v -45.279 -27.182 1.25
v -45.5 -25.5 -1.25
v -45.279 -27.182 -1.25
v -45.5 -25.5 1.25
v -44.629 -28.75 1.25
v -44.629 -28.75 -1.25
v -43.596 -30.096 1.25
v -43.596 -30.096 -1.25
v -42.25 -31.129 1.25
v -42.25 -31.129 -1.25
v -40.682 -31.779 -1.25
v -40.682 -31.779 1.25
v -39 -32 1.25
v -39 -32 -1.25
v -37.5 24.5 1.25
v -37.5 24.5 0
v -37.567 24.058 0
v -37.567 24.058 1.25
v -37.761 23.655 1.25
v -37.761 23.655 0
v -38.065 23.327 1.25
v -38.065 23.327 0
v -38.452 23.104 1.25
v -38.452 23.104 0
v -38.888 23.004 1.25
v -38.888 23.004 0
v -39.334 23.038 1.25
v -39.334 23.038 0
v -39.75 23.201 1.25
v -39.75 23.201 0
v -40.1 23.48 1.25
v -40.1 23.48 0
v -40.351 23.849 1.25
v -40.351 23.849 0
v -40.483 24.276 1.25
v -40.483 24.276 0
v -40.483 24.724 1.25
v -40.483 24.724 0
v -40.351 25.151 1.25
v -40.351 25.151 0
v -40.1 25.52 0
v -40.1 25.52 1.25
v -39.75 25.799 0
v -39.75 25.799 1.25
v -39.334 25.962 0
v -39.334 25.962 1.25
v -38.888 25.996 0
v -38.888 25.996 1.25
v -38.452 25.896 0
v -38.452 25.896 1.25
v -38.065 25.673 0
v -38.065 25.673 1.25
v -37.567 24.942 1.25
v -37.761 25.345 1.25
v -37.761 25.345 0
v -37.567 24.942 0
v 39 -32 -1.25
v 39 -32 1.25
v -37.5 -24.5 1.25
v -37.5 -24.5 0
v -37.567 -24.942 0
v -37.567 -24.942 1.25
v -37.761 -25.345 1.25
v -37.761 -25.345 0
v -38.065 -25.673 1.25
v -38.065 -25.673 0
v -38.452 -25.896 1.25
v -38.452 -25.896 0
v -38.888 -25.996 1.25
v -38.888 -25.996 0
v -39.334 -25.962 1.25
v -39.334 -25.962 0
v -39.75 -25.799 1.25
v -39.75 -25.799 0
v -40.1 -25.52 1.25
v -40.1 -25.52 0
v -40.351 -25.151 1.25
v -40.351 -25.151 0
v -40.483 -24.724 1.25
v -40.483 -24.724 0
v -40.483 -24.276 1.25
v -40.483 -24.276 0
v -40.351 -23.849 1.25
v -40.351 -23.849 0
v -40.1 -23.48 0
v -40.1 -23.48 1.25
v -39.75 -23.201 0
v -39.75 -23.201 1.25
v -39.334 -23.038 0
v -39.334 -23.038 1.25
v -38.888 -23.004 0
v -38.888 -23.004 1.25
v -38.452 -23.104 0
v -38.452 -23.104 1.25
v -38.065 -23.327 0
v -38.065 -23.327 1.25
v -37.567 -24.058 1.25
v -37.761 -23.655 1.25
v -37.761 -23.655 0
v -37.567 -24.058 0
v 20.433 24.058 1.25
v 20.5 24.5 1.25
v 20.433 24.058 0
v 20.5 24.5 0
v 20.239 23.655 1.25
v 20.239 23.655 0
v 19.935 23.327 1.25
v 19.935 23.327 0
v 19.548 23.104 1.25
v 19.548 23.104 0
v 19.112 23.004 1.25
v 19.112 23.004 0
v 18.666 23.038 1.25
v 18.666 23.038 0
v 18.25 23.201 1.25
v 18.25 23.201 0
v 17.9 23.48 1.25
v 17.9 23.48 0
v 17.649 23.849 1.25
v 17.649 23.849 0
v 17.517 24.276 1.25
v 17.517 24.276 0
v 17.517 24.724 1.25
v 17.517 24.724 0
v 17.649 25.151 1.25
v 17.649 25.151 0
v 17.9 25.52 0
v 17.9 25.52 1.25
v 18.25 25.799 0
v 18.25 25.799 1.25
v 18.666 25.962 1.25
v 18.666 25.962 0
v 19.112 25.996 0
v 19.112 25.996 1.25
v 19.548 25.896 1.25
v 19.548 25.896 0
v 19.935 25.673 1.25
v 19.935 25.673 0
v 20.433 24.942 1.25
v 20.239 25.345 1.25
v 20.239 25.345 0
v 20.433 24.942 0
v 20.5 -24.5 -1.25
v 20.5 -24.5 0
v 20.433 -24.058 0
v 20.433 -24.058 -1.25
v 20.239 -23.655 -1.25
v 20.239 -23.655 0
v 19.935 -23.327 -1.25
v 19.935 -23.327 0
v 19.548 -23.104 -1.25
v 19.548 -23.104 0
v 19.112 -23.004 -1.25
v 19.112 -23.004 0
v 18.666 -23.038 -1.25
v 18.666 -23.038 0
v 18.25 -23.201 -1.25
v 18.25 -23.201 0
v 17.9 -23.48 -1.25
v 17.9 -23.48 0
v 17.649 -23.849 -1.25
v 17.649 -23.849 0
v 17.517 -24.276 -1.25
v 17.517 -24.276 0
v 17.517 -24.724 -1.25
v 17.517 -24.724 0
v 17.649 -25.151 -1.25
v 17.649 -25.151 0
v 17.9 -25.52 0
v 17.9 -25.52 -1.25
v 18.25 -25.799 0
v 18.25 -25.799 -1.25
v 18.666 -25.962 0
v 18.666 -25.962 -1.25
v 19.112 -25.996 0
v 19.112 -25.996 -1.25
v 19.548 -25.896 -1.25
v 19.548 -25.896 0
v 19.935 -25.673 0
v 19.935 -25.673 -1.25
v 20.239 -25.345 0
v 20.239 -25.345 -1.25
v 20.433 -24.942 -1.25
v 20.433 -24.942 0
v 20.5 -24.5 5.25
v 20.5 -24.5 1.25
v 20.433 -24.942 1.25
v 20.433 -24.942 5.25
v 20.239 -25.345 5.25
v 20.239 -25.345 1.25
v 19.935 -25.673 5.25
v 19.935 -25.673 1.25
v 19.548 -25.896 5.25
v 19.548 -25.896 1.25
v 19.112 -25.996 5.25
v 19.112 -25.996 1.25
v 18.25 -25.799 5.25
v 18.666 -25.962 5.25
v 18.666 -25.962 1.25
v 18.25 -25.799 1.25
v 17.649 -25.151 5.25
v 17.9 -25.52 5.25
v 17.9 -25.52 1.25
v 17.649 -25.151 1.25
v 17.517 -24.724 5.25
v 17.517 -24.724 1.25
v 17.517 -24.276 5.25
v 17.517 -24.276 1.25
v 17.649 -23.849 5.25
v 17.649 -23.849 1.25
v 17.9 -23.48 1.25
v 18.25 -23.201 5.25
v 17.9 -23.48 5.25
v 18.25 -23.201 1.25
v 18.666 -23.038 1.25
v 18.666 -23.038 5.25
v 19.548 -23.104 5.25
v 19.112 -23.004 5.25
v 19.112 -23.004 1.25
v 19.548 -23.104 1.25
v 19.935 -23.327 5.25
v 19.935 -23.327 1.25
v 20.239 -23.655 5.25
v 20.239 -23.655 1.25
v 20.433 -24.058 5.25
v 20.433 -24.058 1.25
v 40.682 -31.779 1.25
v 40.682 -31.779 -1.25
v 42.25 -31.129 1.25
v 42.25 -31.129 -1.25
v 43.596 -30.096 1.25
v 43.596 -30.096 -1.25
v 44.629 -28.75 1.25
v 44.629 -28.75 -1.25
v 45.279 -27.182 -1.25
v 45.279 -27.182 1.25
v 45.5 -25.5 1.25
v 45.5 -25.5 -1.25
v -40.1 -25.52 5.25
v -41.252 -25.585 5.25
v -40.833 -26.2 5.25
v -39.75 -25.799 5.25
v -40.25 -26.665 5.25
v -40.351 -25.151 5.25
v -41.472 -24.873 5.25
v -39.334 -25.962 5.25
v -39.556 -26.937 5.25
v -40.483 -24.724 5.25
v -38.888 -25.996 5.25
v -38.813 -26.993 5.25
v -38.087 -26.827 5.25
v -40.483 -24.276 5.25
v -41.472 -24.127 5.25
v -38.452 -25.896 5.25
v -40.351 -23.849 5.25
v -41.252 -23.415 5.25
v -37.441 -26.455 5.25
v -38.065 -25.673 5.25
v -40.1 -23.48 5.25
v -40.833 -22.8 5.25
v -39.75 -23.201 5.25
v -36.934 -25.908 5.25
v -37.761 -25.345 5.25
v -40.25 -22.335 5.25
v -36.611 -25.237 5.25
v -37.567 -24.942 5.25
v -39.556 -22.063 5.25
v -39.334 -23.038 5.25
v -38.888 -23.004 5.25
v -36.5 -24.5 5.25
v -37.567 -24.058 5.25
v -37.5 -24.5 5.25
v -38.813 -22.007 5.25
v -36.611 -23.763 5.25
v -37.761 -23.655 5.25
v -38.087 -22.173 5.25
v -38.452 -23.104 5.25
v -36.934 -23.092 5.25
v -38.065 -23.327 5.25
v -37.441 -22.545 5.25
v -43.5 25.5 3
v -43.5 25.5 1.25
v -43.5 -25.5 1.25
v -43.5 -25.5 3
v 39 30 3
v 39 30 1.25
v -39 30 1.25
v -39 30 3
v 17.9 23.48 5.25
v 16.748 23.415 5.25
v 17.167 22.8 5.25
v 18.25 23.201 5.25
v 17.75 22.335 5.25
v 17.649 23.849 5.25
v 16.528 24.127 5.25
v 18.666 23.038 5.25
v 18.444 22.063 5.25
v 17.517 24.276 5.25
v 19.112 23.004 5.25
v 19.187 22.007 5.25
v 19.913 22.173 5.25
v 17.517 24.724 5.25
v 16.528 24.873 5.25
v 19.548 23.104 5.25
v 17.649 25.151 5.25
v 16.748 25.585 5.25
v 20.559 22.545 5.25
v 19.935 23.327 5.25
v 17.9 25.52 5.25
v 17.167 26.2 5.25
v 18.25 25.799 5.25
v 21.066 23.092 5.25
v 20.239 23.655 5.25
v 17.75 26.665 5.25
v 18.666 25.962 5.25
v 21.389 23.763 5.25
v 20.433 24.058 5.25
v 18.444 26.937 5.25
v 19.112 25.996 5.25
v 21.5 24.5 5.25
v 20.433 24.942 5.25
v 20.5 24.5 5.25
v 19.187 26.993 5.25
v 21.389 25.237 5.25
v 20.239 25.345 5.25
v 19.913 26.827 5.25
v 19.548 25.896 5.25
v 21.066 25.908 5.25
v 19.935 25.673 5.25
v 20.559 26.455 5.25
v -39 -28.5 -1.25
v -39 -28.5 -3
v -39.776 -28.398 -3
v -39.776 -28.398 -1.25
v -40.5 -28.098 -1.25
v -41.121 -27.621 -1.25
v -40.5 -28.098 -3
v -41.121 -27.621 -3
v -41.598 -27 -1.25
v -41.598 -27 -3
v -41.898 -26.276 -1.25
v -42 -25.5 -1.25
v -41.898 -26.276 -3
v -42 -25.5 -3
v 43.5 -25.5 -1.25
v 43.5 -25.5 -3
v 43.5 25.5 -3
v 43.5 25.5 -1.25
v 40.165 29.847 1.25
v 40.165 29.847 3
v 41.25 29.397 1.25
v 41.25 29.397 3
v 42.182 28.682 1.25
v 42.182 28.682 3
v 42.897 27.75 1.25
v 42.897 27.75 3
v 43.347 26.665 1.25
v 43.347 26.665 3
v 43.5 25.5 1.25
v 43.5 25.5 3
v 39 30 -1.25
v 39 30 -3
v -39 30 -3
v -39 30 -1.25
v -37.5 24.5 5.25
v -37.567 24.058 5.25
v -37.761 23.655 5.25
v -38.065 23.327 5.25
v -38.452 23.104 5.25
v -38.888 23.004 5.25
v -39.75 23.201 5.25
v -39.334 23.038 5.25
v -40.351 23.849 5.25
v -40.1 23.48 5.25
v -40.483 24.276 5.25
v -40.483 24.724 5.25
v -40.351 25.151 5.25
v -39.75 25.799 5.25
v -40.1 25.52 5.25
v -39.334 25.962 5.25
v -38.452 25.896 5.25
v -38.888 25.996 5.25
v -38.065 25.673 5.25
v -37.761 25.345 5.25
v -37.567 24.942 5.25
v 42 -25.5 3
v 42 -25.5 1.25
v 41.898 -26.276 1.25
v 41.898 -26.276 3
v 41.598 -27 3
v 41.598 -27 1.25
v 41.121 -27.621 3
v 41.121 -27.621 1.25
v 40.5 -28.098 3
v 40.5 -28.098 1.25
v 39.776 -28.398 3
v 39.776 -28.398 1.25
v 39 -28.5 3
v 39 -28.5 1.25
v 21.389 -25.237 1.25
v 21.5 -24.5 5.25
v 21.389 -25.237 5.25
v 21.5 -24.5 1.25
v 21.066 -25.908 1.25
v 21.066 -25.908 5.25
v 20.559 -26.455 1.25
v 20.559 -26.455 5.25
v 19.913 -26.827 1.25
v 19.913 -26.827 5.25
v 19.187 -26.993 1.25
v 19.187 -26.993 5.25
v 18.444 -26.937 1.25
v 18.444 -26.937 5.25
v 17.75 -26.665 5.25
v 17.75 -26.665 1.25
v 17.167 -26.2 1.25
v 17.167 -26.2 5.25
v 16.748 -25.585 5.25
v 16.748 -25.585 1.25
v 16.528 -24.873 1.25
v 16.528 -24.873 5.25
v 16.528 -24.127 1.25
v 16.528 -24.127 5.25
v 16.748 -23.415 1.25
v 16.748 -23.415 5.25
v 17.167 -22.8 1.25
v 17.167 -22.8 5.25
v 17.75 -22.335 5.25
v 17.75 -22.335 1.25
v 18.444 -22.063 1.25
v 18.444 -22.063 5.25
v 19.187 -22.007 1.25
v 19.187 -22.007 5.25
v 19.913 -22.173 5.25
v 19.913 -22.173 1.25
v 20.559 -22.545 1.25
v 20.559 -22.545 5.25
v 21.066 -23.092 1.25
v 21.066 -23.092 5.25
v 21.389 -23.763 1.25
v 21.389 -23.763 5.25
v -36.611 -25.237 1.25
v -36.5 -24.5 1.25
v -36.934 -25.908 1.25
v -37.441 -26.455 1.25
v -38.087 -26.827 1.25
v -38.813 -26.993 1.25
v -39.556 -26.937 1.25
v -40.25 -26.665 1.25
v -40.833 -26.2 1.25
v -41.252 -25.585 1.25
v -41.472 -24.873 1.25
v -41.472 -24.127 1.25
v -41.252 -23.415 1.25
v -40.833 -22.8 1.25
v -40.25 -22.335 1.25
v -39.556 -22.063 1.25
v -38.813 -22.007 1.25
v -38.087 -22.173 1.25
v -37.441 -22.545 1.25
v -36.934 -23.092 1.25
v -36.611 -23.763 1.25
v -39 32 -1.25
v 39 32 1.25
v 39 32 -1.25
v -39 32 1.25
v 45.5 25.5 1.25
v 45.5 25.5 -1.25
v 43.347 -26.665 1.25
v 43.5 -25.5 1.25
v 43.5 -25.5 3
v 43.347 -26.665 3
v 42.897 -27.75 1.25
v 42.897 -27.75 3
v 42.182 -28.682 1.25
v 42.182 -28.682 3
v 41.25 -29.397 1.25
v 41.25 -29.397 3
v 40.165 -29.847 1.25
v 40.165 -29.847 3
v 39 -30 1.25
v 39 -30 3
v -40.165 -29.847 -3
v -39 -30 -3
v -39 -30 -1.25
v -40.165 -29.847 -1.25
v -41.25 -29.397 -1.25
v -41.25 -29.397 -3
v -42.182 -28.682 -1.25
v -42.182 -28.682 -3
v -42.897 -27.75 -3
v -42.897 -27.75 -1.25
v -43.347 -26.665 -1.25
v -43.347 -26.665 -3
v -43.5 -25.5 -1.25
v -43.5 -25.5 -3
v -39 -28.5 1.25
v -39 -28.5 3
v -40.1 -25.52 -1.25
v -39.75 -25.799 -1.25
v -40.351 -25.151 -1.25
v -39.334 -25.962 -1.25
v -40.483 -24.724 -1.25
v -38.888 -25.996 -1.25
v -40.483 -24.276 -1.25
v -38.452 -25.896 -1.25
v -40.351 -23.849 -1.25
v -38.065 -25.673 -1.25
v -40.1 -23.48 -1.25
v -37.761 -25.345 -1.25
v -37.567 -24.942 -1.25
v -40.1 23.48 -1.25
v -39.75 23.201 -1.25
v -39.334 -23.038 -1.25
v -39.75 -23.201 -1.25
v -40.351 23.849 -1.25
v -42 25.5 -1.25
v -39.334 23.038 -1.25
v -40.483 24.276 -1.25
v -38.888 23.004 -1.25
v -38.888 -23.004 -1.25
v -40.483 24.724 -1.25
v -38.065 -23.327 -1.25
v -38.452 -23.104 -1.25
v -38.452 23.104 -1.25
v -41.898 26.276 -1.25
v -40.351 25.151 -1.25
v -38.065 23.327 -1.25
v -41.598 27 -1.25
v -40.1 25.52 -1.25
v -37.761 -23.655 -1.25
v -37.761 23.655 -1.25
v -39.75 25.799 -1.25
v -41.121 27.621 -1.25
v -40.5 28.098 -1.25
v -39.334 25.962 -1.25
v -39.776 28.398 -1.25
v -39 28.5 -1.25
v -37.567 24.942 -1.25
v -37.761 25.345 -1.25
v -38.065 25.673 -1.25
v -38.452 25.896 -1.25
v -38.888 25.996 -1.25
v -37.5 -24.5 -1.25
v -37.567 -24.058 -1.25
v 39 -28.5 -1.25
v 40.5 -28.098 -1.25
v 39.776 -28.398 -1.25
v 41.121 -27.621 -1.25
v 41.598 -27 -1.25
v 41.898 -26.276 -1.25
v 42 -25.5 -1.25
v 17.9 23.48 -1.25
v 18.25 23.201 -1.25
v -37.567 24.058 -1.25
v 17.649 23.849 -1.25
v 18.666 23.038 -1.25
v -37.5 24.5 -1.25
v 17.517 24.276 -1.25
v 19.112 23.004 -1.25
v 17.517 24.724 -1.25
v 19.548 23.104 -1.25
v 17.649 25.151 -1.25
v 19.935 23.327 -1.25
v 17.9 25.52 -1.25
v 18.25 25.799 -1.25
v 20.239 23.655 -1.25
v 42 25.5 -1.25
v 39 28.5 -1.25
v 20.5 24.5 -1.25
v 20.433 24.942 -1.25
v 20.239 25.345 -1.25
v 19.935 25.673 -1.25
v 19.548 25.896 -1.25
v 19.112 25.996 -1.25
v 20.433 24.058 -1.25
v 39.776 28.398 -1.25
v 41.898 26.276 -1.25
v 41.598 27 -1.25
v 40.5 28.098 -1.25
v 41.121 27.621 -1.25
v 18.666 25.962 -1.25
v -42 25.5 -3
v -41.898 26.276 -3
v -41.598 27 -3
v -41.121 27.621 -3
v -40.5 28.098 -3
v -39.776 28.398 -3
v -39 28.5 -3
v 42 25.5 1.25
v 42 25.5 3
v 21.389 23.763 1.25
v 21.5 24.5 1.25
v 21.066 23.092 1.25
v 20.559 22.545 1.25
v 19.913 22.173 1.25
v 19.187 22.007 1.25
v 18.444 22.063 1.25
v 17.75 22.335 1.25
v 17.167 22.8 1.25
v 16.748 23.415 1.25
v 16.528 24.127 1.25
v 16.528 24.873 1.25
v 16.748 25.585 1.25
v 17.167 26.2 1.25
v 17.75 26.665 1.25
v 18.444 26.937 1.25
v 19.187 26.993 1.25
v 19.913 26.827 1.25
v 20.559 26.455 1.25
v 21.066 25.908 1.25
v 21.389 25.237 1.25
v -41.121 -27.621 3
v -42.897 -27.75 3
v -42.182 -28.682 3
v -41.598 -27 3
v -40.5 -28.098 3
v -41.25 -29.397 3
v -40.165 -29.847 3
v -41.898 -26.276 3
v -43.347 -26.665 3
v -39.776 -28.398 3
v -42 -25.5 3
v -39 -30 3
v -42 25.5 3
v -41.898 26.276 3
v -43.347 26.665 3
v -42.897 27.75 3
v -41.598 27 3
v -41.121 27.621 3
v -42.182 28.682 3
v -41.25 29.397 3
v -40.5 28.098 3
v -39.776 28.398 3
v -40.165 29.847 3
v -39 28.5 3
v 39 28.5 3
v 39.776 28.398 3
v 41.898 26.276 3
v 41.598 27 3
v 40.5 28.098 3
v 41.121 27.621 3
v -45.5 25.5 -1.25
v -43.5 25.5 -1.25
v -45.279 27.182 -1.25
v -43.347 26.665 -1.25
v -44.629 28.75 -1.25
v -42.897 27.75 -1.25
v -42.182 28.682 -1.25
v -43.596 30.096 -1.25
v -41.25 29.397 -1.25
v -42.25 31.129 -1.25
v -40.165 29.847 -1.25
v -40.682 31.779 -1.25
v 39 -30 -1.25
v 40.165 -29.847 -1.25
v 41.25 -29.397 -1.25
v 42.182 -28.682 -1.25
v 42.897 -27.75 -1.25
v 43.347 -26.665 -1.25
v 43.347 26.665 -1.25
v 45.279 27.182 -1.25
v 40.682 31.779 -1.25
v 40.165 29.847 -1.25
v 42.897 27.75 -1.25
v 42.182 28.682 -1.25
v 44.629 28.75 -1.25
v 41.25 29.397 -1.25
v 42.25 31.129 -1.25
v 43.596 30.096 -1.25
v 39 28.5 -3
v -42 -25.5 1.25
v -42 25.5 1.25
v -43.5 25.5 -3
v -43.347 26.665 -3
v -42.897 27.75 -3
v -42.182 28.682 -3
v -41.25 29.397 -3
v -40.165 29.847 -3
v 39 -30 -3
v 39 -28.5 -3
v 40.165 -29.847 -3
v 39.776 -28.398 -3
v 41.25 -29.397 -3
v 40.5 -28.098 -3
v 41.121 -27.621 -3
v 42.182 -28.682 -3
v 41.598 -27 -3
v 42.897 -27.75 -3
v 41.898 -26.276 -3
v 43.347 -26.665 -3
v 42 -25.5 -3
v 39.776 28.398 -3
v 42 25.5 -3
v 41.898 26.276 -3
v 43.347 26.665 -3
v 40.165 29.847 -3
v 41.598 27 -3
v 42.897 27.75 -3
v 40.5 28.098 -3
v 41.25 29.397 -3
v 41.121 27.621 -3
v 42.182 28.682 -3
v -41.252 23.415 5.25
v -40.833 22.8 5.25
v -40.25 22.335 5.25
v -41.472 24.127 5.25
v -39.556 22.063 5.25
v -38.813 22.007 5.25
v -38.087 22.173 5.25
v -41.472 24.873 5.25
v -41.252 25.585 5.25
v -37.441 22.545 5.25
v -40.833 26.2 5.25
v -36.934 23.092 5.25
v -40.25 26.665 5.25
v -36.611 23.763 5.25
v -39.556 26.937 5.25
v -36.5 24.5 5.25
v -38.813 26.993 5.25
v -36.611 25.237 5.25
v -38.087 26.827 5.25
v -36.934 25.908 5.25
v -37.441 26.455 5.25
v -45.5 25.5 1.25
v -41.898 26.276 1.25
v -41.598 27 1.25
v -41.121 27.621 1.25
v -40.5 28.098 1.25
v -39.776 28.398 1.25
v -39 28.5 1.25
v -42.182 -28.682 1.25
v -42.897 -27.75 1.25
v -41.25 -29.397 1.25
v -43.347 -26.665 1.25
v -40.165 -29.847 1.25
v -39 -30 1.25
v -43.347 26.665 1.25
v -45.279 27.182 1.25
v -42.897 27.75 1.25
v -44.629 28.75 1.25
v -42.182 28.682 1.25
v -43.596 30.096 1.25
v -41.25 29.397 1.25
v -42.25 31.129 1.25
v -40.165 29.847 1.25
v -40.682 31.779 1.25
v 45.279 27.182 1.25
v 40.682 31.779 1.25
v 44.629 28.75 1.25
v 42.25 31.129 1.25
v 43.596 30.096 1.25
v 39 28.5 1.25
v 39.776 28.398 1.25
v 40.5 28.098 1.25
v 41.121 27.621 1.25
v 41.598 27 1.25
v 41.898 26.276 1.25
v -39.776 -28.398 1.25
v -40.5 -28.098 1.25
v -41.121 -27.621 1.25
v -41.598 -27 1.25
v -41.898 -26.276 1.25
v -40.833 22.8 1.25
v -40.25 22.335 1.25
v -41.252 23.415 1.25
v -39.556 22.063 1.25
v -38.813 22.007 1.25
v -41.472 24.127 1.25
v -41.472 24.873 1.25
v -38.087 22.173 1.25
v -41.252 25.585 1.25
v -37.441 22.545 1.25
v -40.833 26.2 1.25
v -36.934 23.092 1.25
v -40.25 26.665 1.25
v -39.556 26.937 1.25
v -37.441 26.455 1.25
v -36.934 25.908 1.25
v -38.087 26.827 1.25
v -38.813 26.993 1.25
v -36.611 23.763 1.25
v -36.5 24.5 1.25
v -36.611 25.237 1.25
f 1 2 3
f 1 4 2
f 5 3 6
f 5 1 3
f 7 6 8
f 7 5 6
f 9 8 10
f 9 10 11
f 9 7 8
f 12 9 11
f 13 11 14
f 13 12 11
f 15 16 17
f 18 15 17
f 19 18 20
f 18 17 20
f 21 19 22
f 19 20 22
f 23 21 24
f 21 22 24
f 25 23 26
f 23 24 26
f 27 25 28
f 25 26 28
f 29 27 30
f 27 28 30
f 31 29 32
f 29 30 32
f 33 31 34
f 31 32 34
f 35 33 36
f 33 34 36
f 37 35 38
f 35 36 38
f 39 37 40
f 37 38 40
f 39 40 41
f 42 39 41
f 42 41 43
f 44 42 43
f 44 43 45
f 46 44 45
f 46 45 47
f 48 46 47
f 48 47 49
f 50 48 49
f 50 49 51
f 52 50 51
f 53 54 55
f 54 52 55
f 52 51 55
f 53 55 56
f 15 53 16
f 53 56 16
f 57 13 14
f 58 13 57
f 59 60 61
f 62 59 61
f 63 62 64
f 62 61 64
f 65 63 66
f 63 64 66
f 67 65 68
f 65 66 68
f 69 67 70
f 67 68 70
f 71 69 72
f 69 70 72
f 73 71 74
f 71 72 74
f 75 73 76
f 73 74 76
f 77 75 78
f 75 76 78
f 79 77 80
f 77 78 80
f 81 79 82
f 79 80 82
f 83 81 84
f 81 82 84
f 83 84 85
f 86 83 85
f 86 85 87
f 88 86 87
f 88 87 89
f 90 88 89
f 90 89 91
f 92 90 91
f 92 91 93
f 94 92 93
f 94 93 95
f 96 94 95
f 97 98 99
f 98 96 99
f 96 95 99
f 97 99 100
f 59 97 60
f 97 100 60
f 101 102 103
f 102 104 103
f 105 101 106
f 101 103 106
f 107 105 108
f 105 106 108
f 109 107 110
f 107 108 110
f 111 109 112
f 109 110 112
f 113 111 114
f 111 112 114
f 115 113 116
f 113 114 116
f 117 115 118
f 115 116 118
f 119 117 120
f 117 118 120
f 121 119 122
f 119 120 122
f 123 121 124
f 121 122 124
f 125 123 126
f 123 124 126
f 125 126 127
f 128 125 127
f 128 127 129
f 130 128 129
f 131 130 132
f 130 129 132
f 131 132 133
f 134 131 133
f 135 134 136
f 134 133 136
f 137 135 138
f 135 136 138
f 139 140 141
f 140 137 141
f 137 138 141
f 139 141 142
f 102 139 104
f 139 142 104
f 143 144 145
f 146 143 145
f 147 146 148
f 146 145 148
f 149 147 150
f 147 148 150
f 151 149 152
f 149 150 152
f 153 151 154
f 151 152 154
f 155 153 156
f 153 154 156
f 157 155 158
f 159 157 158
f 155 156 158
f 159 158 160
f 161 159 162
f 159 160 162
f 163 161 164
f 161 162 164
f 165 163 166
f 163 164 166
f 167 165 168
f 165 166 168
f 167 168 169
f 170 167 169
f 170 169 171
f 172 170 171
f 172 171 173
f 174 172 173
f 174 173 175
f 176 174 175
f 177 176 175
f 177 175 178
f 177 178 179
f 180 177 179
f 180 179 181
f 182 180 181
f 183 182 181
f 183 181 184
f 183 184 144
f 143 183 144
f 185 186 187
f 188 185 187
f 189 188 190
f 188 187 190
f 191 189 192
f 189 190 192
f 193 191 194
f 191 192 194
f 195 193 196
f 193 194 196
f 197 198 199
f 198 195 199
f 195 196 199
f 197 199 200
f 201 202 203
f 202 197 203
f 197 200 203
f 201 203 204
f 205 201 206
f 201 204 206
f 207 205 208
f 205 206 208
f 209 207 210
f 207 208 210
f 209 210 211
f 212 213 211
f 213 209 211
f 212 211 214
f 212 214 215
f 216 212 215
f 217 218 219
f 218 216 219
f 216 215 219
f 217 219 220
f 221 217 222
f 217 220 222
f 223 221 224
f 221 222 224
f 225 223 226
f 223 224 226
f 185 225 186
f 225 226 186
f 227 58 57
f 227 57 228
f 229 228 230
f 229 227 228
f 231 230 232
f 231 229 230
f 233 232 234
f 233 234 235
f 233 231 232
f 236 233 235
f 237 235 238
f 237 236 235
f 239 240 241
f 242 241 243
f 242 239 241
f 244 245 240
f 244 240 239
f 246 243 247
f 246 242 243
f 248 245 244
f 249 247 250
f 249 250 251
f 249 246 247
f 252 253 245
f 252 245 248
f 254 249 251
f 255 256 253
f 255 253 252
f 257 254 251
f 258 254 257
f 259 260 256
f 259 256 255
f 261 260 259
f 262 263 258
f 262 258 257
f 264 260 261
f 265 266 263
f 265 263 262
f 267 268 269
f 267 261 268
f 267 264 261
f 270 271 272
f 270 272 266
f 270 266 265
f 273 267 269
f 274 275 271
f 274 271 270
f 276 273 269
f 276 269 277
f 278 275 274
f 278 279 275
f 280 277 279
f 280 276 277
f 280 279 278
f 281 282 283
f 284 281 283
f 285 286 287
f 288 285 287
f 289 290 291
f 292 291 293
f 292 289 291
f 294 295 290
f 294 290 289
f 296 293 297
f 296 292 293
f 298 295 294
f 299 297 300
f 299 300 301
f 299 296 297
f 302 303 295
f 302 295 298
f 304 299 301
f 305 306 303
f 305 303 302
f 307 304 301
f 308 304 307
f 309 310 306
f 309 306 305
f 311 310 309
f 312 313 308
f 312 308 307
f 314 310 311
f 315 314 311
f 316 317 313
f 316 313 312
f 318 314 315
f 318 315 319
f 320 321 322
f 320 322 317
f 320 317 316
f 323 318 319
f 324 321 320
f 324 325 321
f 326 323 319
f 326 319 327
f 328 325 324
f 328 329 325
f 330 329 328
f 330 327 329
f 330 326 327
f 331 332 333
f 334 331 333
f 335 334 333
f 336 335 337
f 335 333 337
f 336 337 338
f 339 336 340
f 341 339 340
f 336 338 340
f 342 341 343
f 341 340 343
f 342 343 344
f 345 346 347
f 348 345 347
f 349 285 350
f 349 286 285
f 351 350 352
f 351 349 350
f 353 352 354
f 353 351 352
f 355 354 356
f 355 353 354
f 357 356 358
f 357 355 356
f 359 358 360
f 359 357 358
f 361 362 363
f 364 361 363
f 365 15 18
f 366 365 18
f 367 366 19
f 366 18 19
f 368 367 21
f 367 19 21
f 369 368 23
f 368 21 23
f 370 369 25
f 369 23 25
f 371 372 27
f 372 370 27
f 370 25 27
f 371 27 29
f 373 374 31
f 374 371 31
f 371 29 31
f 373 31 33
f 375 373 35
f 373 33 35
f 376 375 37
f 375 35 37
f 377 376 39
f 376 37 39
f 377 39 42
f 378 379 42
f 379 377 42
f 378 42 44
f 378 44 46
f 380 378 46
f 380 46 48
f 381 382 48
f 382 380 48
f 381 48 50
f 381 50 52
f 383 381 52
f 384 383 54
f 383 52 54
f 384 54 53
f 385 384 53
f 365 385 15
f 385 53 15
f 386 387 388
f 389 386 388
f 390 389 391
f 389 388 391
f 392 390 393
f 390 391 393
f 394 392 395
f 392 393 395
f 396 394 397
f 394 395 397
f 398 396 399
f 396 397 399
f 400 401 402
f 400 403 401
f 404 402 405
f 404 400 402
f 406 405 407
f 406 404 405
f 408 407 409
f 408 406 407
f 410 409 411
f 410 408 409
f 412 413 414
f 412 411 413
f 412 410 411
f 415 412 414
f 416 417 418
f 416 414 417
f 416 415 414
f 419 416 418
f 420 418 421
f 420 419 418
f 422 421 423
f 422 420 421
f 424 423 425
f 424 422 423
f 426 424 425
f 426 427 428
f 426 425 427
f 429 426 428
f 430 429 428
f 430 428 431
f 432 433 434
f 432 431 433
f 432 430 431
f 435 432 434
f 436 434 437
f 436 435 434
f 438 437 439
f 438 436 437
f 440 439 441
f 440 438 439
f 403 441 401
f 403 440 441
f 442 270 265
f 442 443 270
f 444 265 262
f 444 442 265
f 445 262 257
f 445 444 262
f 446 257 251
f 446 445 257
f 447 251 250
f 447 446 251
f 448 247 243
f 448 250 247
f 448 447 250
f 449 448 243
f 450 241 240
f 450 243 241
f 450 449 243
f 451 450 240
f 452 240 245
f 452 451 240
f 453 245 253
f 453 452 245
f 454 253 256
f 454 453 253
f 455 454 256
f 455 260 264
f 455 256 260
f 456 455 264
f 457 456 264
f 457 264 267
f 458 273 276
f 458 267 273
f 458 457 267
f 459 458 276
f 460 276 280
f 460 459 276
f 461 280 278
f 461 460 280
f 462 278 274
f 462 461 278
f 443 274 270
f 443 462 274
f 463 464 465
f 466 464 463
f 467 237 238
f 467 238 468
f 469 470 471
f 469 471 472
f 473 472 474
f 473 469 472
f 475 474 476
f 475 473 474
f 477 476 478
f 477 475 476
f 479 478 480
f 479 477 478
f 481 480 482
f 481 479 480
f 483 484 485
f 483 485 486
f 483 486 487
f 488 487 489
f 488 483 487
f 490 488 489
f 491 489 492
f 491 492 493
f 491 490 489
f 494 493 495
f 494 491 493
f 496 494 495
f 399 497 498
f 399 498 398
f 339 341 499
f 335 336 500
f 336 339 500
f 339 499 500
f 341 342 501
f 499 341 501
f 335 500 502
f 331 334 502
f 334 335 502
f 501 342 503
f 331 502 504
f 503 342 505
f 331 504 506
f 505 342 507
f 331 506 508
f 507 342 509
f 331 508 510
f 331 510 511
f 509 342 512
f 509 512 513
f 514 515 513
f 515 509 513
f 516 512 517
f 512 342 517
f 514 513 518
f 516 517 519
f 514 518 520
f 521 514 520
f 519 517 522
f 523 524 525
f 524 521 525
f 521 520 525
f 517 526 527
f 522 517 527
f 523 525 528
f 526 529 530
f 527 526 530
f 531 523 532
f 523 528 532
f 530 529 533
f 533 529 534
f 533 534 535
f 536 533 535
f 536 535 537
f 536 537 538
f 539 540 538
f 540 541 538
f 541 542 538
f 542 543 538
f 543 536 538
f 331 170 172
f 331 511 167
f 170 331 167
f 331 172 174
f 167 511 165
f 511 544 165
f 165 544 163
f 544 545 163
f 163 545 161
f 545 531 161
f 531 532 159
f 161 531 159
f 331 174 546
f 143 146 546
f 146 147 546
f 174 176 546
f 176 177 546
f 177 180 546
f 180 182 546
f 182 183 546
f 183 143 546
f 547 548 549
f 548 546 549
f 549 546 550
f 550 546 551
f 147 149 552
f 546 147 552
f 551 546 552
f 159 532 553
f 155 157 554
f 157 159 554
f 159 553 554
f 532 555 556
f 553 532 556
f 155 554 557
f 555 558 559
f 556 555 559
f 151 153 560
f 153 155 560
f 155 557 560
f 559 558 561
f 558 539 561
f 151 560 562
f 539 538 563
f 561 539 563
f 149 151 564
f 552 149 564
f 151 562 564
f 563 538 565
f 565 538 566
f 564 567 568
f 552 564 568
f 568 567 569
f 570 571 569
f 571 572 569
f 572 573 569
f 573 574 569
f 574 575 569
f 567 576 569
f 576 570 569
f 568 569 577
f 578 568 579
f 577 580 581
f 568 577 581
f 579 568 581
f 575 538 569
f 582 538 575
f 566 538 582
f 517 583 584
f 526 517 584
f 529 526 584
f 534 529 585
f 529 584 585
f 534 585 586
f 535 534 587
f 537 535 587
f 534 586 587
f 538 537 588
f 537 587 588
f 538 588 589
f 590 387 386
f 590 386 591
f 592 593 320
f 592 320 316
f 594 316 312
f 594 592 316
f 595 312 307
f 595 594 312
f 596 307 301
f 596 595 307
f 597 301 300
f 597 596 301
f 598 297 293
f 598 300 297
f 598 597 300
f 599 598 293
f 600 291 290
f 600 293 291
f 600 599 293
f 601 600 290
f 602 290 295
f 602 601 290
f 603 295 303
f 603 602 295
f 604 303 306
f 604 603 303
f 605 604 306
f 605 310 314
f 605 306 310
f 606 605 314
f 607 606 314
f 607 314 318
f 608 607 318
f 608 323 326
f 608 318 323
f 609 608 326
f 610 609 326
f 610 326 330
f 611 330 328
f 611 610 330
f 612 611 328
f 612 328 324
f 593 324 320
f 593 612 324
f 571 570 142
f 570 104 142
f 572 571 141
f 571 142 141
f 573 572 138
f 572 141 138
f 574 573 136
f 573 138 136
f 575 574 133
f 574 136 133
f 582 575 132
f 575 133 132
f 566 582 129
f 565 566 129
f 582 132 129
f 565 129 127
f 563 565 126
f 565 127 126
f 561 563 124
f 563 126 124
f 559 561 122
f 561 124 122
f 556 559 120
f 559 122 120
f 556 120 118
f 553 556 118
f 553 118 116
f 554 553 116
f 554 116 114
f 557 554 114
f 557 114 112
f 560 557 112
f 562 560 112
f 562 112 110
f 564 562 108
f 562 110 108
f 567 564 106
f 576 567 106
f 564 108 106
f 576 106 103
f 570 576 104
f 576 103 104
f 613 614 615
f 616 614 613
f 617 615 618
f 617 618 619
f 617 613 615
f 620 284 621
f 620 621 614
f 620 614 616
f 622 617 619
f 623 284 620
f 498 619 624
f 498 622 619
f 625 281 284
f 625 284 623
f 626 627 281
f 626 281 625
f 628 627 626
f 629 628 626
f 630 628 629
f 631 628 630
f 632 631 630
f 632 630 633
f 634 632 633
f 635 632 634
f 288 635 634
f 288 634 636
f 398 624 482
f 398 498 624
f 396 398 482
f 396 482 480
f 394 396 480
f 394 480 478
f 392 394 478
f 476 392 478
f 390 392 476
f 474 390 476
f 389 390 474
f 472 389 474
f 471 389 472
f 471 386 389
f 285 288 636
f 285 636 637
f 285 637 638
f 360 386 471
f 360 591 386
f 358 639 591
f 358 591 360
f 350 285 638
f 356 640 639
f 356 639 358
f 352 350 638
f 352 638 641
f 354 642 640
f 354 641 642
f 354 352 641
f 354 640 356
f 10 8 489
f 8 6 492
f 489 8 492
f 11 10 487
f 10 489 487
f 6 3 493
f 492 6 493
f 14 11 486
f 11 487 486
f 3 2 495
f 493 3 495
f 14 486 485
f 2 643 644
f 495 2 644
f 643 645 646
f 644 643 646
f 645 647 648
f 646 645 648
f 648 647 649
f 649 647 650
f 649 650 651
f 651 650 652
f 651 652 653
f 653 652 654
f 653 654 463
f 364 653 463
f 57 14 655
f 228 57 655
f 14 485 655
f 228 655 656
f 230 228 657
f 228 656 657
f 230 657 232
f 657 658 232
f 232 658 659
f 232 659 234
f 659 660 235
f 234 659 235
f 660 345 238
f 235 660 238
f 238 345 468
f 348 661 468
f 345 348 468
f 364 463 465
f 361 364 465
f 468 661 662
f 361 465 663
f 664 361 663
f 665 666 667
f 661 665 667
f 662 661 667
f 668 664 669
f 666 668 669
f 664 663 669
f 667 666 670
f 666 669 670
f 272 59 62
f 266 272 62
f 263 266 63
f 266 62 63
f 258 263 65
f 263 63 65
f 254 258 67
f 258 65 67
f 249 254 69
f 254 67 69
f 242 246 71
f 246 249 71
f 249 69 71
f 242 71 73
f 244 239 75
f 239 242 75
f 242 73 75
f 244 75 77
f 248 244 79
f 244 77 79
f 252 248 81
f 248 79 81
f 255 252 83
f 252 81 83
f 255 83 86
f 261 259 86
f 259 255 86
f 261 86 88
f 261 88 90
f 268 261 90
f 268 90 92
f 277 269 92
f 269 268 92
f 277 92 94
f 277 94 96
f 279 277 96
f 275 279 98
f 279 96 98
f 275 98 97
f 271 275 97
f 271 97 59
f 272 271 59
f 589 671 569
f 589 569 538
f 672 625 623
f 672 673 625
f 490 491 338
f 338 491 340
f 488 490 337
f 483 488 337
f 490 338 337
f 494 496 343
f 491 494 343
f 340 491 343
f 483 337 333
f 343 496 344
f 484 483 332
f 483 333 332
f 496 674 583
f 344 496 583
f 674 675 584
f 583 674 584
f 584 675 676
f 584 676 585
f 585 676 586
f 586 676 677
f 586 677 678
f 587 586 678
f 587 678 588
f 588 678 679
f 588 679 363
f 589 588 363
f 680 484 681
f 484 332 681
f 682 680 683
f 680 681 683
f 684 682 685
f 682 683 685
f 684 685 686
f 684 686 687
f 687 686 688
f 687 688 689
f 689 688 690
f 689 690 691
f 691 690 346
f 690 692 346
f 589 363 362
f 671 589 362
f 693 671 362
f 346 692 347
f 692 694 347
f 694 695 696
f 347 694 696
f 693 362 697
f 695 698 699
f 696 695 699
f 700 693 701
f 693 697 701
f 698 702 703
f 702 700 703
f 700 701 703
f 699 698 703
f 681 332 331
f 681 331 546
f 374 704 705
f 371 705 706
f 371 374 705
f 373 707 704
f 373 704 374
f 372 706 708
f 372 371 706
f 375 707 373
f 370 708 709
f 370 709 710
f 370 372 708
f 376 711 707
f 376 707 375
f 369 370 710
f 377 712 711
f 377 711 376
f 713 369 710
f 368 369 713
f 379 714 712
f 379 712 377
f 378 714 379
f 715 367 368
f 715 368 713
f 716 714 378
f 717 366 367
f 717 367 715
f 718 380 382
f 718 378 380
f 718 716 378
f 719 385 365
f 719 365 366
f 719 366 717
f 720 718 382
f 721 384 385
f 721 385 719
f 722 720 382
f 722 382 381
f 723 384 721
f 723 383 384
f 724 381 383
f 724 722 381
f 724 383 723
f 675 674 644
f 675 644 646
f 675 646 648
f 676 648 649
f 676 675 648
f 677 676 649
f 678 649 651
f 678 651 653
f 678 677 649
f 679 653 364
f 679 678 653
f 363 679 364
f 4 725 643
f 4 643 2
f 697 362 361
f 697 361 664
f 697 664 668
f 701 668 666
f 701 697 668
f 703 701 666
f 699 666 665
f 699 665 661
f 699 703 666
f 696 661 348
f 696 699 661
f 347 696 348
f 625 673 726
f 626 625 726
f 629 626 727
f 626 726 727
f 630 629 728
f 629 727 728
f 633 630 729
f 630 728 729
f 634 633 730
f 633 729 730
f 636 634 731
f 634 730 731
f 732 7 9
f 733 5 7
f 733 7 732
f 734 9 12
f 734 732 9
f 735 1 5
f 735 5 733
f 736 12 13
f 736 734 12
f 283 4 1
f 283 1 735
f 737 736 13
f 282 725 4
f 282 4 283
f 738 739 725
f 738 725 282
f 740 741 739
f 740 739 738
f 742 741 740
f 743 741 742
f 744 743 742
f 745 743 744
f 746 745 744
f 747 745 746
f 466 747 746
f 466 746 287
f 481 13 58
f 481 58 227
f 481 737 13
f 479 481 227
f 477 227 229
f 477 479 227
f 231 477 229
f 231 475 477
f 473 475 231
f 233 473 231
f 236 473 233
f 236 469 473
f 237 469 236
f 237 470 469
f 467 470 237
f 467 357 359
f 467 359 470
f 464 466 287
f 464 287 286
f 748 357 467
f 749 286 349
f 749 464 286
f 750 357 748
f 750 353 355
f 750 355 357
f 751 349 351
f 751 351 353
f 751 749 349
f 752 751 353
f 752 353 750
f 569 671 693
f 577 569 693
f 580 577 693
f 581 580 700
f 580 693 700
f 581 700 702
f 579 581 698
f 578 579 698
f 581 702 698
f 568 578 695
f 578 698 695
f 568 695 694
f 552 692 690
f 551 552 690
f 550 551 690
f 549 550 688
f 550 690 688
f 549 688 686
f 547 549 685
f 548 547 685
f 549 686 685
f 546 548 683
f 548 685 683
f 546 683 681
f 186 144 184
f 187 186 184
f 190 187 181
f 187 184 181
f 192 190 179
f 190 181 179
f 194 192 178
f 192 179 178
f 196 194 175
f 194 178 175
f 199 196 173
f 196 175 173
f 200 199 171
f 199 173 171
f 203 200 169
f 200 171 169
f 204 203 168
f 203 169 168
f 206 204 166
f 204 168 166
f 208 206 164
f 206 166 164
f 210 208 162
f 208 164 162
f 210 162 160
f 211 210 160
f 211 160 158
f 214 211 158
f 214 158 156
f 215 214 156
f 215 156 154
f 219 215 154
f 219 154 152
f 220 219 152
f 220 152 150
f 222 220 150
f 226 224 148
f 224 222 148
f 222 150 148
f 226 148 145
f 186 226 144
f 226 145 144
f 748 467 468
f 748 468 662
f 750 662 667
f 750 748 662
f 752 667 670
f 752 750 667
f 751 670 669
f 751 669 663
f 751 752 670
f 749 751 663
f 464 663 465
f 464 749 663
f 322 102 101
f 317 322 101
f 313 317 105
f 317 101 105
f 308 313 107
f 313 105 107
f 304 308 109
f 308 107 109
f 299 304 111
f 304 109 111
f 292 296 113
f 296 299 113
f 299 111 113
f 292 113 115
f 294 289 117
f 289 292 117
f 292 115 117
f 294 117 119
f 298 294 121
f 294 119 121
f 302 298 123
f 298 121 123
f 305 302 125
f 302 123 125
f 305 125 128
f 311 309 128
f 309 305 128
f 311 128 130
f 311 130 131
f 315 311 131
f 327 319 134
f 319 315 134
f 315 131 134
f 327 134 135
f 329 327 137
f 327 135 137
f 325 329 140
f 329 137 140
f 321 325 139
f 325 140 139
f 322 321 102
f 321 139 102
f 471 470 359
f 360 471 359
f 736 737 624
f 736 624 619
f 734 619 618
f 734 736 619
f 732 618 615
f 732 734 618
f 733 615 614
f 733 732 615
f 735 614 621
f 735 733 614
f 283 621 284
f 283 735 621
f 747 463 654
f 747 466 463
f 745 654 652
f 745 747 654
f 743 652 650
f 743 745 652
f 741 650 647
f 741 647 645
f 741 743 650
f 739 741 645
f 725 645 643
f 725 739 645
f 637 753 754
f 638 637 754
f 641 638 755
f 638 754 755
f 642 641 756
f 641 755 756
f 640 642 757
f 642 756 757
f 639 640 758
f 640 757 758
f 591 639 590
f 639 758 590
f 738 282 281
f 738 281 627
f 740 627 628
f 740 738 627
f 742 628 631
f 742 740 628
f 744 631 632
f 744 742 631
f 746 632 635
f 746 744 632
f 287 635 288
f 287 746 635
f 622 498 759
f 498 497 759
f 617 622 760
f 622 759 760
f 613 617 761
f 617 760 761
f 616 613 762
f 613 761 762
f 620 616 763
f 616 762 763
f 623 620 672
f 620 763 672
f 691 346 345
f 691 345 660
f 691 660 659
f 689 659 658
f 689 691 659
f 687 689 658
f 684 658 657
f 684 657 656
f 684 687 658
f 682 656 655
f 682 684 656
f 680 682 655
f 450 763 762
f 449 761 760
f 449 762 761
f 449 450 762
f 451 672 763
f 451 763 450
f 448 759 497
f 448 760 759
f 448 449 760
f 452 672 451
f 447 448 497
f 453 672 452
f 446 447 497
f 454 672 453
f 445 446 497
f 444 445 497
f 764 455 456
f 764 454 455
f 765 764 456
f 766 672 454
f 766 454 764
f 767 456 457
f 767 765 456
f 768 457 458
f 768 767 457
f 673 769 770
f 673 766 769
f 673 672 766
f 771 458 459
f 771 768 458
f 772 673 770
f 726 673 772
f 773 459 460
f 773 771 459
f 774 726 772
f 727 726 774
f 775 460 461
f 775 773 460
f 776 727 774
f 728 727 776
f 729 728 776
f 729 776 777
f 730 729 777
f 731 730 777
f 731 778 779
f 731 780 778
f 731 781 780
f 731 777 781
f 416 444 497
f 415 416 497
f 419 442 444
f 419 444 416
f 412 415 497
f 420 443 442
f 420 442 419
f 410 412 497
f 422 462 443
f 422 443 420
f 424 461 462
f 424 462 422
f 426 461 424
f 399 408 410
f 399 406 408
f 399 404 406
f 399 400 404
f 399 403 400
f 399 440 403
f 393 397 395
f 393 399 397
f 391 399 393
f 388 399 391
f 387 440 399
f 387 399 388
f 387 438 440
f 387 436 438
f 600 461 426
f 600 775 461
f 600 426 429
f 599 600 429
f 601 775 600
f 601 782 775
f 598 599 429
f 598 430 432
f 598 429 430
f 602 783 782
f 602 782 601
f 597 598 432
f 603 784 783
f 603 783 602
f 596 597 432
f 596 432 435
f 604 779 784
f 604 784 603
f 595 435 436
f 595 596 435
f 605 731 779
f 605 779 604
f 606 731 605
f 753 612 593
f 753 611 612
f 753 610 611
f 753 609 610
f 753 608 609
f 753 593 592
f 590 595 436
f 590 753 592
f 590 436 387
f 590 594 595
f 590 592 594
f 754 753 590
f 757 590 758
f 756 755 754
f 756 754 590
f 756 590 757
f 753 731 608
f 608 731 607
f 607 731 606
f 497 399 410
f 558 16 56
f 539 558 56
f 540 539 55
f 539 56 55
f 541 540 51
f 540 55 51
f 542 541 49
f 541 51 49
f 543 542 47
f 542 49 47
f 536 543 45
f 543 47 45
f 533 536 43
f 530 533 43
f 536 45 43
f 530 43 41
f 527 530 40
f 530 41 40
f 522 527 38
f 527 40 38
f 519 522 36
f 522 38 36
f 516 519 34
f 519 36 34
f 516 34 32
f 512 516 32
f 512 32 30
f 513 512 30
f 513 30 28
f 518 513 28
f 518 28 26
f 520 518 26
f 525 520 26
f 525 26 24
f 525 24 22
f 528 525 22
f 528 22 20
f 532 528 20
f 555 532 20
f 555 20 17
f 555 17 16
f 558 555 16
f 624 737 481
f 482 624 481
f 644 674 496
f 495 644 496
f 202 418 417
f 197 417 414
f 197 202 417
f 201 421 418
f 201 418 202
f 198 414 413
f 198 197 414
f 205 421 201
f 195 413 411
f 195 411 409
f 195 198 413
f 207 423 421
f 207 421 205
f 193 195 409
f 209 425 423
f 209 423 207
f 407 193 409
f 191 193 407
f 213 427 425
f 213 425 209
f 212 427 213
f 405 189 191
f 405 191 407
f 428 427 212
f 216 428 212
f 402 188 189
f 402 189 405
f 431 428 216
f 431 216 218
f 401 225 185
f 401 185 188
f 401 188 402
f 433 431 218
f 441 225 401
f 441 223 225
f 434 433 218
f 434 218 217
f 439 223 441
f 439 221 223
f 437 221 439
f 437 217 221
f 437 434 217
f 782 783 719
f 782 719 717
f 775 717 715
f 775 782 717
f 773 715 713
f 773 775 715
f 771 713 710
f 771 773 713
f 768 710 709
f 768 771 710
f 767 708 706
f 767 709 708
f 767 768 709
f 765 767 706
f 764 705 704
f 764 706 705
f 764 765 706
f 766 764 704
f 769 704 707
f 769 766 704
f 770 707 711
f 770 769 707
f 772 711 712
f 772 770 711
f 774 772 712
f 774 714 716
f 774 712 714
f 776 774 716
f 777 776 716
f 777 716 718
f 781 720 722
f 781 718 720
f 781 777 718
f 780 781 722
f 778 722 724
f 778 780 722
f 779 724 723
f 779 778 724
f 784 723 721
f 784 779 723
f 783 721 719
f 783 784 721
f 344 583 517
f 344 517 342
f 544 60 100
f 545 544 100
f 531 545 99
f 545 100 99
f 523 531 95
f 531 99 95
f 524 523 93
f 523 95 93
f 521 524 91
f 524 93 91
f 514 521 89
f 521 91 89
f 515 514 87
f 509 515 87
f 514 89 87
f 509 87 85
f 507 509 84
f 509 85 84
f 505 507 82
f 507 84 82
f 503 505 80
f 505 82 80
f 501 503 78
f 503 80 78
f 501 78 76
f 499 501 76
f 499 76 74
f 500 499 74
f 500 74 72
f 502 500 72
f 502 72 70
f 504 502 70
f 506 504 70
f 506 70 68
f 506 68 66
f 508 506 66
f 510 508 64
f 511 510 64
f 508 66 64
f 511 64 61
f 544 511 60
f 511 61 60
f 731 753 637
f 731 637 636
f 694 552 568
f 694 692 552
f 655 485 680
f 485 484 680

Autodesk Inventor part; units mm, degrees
ref_plane "YZ Plane" through (0, 0, 0) normal (1, 0, 0) x (0, 1, 0)
ref_plane "XZ Plane" through (0, 0, 0) normal (0, 1, 0) x (-1, 0, 0)
ref_plane "XY Plane" through (0, 0, 0) normal (0, 0, 1) x (1, 0, 0)
sketch "Boceto1" plane through (0, 0, 0) normal (0, 0, 1) x (1, 0, 0)
  line L0 (-39, -32) -> (39, -32)
  line L1 (45.5, -25.5) -> (45.5, 25.5)
  line L2 (39, 32) -> (-39, 32)
  line L3 (-45.5, 25.5) -> (-45.5, -25.5)
  line L4 (-45.5, -32) -> (45.5, 32) construction
  line L5 (45.5, -32) -> (-45.5, 32) construction
  line L6 (-45.5, -32) -> (45.5, -32) construction
  arc A0 (-39, 32) -> (-45.5, 25.5) centre (-39, 25.5) ccw
  arc A1 (-45.5, -25.5) -> (-39, -32) centre (-39, -25.5) ccw
  arc A2 (45.5, 25.5) -> (39, 32) centre (39, 25.5) ccw
  arc A3 (39, -32) -> (45.5, -25.5) centre (39, -25.5) ccw
  line L7 (-43.5, 25.5) -> (-43.5, -25.5)
  arc A4 (-43.5, -25.5) -> (-39, -30) centre (-39, -25.5) ccw
  line L8 (-39, -30) -> (39, -30)
  arc A5 (39, -30) -> (43.5, -25.5) centre (39, -25.5) ccw
  line L9 (43.5, -25.5) -> (43.5, 25.5)
  arc A6 (43.5, 25.5) -> (39, 30) centre (39, 25.5) ccw
  line L10 (39, 30) -> (-39, 30)
  arc A7 (-39, 30) -> (-43.5, 25.5) centre (-39, 25.5) ccw
  line L11 (-42, 25.5) -> (-42, -25.5)
  arc A8 (-42, -25.5) -> (-39, -28.5) centre (-39, -25.5) ccw
  line L12 (-39, -28.5) -> (39, -28.5)
  arc A9 (39, -28.5) -> (42, -25.5) centre (39, -25.5) ccw
  line L13 (42, -25.5) -> (42, 25.5)
  arc A10 (42, 25.5) -> (39, 28.5) centre (39, 25.5) ccw
  line L14 (39, 28.5) -> (-39, 28.5)
  arc A11 (-39, 28.5) -> (-42, 25.5) centre (-39, 25.5) ccw
  circle A12 centre (-39, 24.5) radius 1.5
  circle A13 centre (-39, -24.5) radius 1.5
  circle A14 centre (19, 24.5) radius 1.5
  circle A15 centre (19, -24.5) radius 1.5
  line L15 (-42.5, 28) -> (42.5, 28) construction
  line L16 (42.5, 28) -> (42.5, -28) construction
  line L17 (42.5, -28) -> (-42.5, -28) construction
  line L18 (-42.5, -28) -> (-42.5, 28) construction
  line L19 (-42.5, 28) -> (42.5, -28) construction
  line L20 (42.5, 28) -> (-42.5, -28) construction
  point P0 (0, 0)
  dimension "d0" = 91
  dimension "d1" = 0
  dimension "d2" = 64
  dimension "d4" = 13
  dimension "d5" = 13
  dimension "d6" = 13
  dimension "d7" = 13
  dimension "d48" = 2
  dimension "d49" = 1.5
  dimension "d52" = 3
  dimension "d55" = 3
  dimension "d56" = 3
  dimension "d57" = 3
  dimension "d58" = 58
  dimension "d59" = 49
  dimension "d60" = 60
  dimension "d61" = 87
  dimension "d62" = 85
  dimension "d63" = 56
  dimension "d64" = 3.5
  dimension "d65" = 3.5
extrude "Extrusión3" add sketch "Boceto1" along normal mid plane 2.5 contours A1 L3 A0 L2 A2 L1 A3 L0 | A7 L10 A6 L9 A5 L8 A4 L7 | A11 L14 A10 L13 A9 L12 A8 L11
extrude "Extrusión4" add sketch "Boceto1" along normal mid plane 6 contours A7 L10 A6 L9 A5 L8 A4 L7
sketch "Boceto3" plane through (0, 0, 1.25) normal (0, 0, 1) x (1, 0, 0)
  arc A0 (-39, 28.5) -> (-42, 25.5) centre (-39, 25.5) ccw projected
  line L0 (-42, 25.5) -> (-42, -25.5) projected
  arc A1 (-42, -25.5) -> (-39, -28.5) centre (-39, -25.5) ccw projected
  line L1 (-39, -28.5) -> (39, -28.5) projected
  arc A2 (39, -28.5) -> (42, -25.5) centre (39, -25.5) ccw projected
  line L2 (42, -25.5) -> (42, 25.5) projected
  arc A3 (42, 25.5) -> (39, 28.5) centre (39, 25.5) ccw projected
  line L3 (39, 28.5) -> (-39, 28.5) projected
  circle A4 centre (19, -24.5) radius 1.5 projected
  circle A5 centre (19, 24.5) radius 1.5 projected
  circle A6 centre (-39, -24.5) radius 1.5 projected
  circle A7 centre (-39, 24.5) radius 1.5 projected
  circle A8 centre (-39, -24.5) radius 2.5
  circle A9 centre (-39, 24.5) radius 2.5
  circle A10 centre (19, -24.5) radius 2.5
  circle A11 centre (19, 24.5) radius 2.5
  point P0 (0, 0)
  dimension "d70" = 1
  dimension "d71" = 1
  dimension "d72" = 1
  dimension "d73" = 1
extrude "Extrusión5" add sketch "Boceto3" along normal blind 4 contours A8 | A9 | A10 | A11
properties part number "TapaIntermedia"
